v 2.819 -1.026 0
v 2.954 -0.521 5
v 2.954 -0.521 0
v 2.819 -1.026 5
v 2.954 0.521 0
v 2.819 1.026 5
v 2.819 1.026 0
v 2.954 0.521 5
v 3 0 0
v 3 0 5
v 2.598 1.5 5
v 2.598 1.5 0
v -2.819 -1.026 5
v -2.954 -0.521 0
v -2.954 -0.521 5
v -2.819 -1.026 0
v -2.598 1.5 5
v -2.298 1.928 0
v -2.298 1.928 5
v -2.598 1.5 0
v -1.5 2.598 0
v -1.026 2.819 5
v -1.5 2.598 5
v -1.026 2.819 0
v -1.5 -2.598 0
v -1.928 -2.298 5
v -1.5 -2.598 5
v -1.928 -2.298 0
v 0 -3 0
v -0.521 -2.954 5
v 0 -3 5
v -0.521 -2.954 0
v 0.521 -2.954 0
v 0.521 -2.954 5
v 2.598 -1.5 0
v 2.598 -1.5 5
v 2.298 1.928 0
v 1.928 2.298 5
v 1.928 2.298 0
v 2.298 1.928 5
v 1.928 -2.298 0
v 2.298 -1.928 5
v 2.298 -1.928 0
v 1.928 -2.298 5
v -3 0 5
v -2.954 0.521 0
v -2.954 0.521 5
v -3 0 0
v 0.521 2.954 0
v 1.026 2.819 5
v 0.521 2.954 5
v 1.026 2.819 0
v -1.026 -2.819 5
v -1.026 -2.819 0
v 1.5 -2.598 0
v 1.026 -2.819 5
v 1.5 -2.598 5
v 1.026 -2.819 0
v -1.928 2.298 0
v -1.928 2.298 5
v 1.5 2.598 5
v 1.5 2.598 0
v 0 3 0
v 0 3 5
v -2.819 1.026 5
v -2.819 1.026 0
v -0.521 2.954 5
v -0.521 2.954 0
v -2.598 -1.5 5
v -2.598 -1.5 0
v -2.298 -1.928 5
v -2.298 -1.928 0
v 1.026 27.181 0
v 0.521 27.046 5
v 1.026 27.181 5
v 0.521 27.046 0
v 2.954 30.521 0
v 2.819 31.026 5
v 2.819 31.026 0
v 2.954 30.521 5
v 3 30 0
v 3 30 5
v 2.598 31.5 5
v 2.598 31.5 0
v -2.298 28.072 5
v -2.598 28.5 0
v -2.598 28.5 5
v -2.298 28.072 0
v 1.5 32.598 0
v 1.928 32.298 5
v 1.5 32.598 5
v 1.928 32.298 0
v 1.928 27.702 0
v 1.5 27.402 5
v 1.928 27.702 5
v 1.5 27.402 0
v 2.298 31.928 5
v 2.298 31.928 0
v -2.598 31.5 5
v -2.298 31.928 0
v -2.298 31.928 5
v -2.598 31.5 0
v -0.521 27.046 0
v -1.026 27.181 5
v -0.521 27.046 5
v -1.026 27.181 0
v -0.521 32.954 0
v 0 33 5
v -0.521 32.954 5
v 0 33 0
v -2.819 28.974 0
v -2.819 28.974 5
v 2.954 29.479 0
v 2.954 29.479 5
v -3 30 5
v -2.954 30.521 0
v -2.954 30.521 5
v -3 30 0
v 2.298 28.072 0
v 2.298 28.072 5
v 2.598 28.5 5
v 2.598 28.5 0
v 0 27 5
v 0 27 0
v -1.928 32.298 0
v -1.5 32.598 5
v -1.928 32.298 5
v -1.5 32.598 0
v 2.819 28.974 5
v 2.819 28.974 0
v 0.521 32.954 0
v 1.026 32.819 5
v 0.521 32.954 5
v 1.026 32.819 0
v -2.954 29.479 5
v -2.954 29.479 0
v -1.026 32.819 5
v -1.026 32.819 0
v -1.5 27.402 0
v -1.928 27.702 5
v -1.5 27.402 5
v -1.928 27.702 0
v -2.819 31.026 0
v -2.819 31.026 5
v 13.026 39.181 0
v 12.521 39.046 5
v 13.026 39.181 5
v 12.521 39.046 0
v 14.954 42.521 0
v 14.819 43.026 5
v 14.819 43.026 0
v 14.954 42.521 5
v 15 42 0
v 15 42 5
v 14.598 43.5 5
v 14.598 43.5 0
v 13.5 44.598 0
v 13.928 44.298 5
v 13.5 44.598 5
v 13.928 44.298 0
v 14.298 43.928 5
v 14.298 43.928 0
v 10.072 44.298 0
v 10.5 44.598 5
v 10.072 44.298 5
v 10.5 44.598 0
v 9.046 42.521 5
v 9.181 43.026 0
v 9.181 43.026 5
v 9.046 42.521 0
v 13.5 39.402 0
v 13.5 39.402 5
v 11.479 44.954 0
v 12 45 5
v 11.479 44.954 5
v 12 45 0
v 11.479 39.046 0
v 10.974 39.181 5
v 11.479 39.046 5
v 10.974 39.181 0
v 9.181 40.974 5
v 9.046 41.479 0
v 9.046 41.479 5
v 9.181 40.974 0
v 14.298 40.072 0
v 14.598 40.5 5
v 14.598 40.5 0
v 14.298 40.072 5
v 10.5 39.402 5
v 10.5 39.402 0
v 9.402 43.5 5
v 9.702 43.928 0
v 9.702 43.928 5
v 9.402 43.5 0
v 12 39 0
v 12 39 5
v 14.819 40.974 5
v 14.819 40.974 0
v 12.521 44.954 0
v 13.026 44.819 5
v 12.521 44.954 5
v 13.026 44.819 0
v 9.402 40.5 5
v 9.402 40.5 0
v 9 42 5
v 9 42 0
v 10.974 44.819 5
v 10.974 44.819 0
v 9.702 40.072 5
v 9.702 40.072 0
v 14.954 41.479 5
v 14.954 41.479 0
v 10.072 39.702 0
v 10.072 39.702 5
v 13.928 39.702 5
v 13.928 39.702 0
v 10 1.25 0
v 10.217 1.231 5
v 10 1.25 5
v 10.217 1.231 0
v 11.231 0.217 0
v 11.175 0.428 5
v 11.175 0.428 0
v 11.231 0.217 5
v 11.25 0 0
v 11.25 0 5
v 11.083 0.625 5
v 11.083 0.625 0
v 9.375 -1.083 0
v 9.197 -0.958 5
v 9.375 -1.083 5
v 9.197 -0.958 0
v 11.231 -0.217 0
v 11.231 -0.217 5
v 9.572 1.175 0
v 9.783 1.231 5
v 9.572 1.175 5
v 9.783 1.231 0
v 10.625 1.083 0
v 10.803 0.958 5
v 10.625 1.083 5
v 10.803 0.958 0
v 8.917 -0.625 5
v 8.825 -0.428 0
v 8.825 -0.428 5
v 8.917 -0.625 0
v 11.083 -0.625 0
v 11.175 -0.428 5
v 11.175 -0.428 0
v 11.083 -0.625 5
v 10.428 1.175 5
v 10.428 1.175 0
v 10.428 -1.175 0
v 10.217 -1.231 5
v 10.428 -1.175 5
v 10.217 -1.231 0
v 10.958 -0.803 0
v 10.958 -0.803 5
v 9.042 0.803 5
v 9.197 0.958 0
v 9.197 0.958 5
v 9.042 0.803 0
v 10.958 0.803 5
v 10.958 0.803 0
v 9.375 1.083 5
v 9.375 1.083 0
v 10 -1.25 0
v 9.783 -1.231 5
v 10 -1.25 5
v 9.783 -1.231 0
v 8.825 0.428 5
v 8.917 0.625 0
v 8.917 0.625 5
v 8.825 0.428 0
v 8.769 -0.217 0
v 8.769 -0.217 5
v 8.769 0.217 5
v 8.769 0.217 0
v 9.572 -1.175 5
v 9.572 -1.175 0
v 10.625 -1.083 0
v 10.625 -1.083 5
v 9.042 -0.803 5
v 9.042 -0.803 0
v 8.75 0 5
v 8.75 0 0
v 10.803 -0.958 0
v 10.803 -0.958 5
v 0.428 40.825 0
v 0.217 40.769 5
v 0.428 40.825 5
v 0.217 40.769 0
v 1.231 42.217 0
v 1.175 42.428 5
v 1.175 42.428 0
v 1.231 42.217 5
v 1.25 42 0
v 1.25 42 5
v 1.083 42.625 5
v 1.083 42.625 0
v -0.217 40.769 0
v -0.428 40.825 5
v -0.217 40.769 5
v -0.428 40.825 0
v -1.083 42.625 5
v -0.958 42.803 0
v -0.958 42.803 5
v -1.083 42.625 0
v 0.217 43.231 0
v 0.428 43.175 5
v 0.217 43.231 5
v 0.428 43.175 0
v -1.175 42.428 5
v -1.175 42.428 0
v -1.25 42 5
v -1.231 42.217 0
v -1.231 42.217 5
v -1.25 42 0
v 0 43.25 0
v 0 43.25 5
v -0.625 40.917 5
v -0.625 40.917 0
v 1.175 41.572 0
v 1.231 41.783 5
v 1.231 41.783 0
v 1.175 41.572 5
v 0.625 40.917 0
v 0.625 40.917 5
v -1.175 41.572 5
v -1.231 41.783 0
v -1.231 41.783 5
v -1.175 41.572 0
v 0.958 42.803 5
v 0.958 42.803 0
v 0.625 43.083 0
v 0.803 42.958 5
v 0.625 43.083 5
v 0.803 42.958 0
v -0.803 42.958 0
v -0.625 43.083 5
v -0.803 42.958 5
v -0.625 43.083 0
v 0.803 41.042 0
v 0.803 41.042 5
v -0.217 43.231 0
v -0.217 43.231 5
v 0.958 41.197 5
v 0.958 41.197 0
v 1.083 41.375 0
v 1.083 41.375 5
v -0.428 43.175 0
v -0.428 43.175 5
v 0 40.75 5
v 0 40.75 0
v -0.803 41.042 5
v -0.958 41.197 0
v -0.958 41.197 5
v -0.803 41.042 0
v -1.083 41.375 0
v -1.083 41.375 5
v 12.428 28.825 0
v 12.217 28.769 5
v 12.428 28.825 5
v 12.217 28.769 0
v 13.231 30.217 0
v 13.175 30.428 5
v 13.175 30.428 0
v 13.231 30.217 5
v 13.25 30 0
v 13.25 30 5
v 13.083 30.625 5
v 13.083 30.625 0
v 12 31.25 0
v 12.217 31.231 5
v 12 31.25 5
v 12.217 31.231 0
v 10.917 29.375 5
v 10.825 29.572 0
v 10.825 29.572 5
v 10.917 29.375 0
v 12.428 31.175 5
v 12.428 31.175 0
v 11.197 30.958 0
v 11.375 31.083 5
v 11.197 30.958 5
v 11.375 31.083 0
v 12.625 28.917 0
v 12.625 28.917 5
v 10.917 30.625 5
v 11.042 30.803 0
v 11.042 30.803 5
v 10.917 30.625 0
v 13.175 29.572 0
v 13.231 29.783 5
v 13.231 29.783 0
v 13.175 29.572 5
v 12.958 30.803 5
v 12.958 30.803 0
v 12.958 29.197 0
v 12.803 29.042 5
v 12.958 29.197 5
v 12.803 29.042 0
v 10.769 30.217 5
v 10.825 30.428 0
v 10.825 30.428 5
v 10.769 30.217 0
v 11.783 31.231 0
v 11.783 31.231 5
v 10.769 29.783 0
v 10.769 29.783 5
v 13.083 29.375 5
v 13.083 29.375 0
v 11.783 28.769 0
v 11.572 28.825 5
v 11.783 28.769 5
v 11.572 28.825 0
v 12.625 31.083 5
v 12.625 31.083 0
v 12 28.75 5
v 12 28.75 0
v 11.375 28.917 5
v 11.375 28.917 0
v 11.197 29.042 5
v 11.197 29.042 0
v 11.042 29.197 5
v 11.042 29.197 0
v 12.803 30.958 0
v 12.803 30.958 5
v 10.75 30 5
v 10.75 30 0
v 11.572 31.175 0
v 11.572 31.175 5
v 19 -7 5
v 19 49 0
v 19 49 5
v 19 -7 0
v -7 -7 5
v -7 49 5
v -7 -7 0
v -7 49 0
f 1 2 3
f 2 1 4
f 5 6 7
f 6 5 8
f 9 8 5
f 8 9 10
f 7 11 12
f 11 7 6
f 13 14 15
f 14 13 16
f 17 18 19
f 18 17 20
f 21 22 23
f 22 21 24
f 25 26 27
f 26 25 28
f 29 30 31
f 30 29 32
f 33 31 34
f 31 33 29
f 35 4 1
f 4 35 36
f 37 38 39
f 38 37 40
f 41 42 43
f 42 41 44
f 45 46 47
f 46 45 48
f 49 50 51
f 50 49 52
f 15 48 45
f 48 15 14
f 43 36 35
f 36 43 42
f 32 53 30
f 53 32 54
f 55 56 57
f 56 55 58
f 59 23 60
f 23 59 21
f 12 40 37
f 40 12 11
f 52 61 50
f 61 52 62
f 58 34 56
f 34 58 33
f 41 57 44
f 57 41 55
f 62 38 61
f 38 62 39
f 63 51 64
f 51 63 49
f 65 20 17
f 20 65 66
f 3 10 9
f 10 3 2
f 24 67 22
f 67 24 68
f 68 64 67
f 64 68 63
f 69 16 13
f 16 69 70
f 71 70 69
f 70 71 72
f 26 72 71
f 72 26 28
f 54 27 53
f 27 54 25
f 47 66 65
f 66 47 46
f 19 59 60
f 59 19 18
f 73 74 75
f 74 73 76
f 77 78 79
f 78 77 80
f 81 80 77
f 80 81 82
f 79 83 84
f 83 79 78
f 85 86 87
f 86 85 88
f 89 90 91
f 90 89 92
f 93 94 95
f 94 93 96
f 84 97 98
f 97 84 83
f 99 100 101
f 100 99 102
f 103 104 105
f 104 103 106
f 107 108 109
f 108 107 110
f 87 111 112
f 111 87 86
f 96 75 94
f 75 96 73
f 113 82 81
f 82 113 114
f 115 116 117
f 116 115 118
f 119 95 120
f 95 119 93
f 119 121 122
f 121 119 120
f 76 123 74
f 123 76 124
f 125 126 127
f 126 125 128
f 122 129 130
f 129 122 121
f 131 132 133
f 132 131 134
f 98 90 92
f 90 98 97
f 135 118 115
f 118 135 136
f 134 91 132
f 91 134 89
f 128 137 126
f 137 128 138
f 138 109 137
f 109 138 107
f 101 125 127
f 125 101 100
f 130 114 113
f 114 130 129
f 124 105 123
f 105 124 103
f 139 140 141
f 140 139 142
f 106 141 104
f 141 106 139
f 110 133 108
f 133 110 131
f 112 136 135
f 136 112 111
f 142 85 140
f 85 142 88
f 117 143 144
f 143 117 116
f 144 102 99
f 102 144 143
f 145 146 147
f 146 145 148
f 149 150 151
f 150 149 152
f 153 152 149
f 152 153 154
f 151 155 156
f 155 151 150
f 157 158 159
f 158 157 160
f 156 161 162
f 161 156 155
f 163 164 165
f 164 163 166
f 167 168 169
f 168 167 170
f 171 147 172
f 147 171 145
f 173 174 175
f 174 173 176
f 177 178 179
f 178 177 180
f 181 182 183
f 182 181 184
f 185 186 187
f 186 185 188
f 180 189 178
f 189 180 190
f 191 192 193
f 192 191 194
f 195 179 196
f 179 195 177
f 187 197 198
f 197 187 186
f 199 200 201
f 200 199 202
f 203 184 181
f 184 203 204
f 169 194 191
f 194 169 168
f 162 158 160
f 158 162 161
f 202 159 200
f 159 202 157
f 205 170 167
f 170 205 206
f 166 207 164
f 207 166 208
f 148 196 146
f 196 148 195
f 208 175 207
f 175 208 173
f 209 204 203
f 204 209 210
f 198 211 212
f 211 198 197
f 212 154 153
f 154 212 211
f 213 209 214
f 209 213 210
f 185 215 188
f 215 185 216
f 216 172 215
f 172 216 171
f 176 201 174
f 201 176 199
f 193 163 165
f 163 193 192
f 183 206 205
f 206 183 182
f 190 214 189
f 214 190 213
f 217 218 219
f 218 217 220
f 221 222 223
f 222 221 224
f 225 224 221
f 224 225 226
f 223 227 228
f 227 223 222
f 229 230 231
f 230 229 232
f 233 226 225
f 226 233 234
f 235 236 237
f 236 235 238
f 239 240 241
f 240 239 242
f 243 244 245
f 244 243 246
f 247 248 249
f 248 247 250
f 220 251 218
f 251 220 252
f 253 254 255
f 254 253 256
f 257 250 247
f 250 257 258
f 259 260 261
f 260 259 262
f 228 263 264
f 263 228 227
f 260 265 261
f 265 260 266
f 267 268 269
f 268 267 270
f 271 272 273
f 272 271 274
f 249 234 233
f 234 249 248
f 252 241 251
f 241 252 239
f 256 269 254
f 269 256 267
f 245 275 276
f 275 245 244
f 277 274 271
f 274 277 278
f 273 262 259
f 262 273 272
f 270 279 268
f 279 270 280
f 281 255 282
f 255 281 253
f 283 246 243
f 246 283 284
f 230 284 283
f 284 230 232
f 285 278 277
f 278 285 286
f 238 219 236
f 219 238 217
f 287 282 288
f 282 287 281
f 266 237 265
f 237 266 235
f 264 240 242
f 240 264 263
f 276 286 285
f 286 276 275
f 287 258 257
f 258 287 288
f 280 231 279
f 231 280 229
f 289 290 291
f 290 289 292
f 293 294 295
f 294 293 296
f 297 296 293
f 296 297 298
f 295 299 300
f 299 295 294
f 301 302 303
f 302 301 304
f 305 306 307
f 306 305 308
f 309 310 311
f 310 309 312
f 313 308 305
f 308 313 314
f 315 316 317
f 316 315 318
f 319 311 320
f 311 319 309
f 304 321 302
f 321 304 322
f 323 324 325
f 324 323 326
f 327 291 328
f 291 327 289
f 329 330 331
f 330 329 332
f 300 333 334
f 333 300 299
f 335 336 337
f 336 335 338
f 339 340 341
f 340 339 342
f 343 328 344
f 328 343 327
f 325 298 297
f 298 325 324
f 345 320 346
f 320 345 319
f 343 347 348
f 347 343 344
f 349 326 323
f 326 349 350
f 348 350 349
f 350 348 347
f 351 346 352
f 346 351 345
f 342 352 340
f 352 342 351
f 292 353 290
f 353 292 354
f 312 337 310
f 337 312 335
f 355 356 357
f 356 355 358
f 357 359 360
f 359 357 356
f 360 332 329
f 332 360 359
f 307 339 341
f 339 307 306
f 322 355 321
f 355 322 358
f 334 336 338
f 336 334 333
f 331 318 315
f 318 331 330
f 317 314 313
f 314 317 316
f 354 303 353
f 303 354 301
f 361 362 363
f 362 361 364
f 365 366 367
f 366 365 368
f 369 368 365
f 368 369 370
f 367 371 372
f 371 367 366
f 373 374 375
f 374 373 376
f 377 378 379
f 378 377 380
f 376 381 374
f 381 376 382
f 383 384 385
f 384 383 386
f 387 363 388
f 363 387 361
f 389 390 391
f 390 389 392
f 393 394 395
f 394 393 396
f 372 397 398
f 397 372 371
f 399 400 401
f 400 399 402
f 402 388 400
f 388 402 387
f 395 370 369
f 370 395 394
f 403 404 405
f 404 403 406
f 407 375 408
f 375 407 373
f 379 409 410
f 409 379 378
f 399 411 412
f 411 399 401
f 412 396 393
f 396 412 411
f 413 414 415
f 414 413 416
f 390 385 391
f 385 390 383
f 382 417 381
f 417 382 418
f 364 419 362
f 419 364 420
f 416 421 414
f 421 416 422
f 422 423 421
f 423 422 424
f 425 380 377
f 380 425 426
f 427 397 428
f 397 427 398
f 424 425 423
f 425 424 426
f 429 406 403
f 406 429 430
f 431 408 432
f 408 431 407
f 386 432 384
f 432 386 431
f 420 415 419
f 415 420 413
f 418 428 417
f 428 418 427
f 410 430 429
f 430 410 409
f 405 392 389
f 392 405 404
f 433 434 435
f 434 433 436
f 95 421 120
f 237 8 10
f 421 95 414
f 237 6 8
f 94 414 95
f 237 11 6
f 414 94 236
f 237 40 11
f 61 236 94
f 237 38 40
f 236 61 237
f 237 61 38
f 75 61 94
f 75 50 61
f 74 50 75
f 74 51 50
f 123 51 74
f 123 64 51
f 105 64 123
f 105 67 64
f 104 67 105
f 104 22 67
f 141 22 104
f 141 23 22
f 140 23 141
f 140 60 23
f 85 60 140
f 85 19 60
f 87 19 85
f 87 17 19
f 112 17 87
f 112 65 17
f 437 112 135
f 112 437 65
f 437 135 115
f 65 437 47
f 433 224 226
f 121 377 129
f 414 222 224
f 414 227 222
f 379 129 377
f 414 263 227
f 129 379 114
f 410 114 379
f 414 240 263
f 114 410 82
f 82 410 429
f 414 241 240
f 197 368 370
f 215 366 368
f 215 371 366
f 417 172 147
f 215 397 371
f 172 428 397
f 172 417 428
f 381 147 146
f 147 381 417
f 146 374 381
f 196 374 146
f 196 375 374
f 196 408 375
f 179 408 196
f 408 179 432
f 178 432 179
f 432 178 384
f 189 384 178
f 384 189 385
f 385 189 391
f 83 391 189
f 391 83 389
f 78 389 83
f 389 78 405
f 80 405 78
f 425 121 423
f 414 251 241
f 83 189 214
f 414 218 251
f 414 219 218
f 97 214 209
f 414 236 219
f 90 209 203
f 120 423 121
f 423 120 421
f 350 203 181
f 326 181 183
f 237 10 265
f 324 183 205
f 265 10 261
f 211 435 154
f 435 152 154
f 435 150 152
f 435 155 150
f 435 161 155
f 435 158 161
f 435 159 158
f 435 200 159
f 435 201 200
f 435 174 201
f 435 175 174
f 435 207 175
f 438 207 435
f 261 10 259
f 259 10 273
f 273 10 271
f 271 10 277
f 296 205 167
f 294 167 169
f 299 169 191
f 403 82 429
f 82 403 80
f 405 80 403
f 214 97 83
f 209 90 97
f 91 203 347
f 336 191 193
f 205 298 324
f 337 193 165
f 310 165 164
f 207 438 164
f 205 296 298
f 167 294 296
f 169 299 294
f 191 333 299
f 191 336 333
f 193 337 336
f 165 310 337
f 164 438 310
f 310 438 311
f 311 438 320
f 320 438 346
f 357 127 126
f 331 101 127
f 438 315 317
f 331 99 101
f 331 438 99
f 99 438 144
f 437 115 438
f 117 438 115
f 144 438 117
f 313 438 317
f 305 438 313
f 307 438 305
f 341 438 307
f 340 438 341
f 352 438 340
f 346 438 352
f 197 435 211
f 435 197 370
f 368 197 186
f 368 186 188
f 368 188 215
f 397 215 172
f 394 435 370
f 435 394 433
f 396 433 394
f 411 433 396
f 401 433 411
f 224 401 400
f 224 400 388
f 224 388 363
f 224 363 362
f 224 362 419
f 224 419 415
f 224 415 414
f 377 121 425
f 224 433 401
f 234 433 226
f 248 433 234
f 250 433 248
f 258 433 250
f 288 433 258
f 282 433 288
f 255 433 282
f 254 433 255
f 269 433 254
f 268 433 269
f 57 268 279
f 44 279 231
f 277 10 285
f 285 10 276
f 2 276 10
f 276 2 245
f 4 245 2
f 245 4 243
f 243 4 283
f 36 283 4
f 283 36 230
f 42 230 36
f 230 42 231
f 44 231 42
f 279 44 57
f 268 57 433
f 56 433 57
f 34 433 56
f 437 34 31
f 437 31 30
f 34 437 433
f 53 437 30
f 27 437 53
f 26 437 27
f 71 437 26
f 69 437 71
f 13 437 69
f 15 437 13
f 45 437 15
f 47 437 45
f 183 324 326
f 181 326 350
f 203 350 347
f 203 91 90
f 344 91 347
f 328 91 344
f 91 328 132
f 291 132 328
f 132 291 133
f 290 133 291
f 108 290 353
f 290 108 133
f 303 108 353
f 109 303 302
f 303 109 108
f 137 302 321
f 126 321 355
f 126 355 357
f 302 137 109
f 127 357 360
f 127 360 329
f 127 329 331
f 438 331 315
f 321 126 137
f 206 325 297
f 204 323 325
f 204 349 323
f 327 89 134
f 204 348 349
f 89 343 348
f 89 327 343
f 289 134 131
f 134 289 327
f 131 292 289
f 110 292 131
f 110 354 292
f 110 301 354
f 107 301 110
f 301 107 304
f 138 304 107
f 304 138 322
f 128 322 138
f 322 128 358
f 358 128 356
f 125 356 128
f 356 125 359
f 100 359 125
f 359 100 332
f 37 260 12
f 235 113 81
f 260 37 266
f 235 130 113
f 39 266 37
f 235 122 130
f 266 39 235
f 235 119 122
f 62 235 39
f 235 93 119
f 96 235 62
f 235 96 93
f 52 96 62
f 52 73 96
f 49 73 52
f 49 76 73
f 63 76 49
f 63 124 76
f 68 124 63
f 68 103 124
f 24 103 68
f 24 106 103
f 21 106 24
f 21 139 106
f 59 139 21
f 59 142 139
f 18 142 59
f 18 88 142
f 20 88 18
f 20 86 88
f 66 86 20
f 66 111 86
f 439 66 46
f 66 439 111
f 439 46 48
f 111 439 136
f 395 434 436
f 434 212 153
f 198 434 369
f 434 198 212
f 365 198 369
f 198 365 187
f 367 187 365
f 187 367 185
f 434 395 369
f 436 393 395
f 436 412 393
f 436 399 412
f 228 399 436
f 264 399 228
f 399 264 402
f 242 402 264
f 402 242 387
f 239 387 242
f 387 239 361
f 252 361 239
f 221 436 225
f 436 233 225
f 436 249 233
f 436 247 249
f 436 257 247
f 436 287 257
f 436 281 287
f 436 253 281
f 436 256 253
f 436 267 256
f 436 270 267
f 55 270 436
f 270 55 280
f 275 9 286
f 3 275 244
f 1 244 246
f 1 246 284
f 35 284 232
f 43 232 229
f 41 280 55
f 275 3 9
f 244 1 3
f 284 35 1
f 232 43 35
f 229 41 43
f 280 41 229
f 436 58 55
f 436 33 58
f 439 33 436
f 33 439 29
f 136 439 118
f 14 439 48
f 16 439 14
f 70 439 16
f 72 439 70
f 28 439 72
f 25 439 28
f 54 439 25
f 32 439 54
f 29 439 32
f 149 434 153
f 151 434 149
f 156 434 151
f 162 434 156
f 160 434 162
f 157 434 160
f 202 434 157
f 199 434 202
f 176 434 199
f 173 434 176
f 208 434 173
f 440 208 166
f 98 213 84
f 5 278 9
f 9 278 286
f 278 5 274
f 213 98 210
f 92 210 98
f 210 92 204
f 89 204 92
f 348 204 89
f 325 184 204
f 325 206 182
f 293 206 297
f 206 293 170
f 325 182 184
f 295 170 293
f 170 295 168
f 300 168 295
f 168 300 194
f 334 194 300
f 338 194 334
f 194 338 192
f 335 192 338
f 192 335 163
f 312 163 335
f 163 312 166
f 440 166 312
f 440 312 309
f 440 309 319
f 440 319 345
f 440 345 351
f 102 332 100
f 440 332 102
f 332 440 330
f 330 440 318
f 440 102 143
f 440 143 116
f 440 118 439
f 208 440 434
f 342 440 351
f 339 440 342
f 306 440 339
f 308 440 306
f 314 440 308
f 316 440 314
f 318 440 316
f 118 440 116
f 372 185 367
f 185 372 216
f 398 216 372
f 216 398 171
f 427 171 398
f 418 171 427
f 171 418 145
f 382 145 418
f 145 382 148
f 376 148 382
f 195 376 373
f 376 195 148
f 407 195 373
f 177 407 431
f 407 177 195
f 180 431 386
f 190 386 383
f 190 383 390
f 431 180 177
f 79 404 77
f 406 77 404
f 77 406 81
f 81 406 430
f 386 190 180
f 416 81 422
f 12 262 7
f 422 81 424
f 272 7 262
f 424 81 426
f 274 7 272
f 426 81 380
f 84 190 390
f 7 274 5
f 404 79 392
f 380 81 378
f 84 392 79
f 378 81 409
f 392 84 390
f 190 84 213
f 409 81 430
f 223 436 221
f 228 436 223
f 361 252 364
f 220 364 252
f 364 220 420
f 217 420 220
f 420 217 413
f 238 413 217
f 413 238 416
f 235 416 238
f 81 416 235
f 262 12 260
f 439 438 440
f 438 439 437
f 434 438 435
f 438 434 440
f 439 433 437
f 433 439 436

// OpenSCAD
module spacer1() {
  difference() {
    union() {
      cylinder(d=12,h=5,$fn=36);
      cylinder(d=7,h=6,$fn=36);
    }
    cylinder(d=4.5,h=100,center=true,$fn=36);
  }
}
module spacer2() {
  difference() {
    cylinder(d=14,h=1.7,$fn=36);
    translate([0,0,0.7]) {
      cylinder(d=9,h=10,$fn=36);
      translate([0,3,5])cube([3,5,10],true);
    }
    cylinder(d=5.5,h=100,center=true,$fn=36);
  }
}

module voltmeter_holder() {
  difference() {
    union() {
      cube([34,22,5],true);
    }
    cube([23.5,15,20],true);
    for(a=[0,1])mirror([a,0])translate([14,0]) cylinder(d=2,h=20,center=true,$fn=24);
  }
}
module fuse_holder() {
  difference() {
    union() {
      translate([-7,-7])cube([7+7+12,7+7+30+12,5]);
    }
    for(xy=[[0,0],[0,30],[12,42]]) translate(xy)
      cylinder(d=6,h=20,center=true,$fn=36);
    for(xy=[[10,0],[0,42],[12,30]]) translate(xy)
      cylinder(d=2.5,h=20,center=true,$fn=36);
  }
}

fuse_holder();
